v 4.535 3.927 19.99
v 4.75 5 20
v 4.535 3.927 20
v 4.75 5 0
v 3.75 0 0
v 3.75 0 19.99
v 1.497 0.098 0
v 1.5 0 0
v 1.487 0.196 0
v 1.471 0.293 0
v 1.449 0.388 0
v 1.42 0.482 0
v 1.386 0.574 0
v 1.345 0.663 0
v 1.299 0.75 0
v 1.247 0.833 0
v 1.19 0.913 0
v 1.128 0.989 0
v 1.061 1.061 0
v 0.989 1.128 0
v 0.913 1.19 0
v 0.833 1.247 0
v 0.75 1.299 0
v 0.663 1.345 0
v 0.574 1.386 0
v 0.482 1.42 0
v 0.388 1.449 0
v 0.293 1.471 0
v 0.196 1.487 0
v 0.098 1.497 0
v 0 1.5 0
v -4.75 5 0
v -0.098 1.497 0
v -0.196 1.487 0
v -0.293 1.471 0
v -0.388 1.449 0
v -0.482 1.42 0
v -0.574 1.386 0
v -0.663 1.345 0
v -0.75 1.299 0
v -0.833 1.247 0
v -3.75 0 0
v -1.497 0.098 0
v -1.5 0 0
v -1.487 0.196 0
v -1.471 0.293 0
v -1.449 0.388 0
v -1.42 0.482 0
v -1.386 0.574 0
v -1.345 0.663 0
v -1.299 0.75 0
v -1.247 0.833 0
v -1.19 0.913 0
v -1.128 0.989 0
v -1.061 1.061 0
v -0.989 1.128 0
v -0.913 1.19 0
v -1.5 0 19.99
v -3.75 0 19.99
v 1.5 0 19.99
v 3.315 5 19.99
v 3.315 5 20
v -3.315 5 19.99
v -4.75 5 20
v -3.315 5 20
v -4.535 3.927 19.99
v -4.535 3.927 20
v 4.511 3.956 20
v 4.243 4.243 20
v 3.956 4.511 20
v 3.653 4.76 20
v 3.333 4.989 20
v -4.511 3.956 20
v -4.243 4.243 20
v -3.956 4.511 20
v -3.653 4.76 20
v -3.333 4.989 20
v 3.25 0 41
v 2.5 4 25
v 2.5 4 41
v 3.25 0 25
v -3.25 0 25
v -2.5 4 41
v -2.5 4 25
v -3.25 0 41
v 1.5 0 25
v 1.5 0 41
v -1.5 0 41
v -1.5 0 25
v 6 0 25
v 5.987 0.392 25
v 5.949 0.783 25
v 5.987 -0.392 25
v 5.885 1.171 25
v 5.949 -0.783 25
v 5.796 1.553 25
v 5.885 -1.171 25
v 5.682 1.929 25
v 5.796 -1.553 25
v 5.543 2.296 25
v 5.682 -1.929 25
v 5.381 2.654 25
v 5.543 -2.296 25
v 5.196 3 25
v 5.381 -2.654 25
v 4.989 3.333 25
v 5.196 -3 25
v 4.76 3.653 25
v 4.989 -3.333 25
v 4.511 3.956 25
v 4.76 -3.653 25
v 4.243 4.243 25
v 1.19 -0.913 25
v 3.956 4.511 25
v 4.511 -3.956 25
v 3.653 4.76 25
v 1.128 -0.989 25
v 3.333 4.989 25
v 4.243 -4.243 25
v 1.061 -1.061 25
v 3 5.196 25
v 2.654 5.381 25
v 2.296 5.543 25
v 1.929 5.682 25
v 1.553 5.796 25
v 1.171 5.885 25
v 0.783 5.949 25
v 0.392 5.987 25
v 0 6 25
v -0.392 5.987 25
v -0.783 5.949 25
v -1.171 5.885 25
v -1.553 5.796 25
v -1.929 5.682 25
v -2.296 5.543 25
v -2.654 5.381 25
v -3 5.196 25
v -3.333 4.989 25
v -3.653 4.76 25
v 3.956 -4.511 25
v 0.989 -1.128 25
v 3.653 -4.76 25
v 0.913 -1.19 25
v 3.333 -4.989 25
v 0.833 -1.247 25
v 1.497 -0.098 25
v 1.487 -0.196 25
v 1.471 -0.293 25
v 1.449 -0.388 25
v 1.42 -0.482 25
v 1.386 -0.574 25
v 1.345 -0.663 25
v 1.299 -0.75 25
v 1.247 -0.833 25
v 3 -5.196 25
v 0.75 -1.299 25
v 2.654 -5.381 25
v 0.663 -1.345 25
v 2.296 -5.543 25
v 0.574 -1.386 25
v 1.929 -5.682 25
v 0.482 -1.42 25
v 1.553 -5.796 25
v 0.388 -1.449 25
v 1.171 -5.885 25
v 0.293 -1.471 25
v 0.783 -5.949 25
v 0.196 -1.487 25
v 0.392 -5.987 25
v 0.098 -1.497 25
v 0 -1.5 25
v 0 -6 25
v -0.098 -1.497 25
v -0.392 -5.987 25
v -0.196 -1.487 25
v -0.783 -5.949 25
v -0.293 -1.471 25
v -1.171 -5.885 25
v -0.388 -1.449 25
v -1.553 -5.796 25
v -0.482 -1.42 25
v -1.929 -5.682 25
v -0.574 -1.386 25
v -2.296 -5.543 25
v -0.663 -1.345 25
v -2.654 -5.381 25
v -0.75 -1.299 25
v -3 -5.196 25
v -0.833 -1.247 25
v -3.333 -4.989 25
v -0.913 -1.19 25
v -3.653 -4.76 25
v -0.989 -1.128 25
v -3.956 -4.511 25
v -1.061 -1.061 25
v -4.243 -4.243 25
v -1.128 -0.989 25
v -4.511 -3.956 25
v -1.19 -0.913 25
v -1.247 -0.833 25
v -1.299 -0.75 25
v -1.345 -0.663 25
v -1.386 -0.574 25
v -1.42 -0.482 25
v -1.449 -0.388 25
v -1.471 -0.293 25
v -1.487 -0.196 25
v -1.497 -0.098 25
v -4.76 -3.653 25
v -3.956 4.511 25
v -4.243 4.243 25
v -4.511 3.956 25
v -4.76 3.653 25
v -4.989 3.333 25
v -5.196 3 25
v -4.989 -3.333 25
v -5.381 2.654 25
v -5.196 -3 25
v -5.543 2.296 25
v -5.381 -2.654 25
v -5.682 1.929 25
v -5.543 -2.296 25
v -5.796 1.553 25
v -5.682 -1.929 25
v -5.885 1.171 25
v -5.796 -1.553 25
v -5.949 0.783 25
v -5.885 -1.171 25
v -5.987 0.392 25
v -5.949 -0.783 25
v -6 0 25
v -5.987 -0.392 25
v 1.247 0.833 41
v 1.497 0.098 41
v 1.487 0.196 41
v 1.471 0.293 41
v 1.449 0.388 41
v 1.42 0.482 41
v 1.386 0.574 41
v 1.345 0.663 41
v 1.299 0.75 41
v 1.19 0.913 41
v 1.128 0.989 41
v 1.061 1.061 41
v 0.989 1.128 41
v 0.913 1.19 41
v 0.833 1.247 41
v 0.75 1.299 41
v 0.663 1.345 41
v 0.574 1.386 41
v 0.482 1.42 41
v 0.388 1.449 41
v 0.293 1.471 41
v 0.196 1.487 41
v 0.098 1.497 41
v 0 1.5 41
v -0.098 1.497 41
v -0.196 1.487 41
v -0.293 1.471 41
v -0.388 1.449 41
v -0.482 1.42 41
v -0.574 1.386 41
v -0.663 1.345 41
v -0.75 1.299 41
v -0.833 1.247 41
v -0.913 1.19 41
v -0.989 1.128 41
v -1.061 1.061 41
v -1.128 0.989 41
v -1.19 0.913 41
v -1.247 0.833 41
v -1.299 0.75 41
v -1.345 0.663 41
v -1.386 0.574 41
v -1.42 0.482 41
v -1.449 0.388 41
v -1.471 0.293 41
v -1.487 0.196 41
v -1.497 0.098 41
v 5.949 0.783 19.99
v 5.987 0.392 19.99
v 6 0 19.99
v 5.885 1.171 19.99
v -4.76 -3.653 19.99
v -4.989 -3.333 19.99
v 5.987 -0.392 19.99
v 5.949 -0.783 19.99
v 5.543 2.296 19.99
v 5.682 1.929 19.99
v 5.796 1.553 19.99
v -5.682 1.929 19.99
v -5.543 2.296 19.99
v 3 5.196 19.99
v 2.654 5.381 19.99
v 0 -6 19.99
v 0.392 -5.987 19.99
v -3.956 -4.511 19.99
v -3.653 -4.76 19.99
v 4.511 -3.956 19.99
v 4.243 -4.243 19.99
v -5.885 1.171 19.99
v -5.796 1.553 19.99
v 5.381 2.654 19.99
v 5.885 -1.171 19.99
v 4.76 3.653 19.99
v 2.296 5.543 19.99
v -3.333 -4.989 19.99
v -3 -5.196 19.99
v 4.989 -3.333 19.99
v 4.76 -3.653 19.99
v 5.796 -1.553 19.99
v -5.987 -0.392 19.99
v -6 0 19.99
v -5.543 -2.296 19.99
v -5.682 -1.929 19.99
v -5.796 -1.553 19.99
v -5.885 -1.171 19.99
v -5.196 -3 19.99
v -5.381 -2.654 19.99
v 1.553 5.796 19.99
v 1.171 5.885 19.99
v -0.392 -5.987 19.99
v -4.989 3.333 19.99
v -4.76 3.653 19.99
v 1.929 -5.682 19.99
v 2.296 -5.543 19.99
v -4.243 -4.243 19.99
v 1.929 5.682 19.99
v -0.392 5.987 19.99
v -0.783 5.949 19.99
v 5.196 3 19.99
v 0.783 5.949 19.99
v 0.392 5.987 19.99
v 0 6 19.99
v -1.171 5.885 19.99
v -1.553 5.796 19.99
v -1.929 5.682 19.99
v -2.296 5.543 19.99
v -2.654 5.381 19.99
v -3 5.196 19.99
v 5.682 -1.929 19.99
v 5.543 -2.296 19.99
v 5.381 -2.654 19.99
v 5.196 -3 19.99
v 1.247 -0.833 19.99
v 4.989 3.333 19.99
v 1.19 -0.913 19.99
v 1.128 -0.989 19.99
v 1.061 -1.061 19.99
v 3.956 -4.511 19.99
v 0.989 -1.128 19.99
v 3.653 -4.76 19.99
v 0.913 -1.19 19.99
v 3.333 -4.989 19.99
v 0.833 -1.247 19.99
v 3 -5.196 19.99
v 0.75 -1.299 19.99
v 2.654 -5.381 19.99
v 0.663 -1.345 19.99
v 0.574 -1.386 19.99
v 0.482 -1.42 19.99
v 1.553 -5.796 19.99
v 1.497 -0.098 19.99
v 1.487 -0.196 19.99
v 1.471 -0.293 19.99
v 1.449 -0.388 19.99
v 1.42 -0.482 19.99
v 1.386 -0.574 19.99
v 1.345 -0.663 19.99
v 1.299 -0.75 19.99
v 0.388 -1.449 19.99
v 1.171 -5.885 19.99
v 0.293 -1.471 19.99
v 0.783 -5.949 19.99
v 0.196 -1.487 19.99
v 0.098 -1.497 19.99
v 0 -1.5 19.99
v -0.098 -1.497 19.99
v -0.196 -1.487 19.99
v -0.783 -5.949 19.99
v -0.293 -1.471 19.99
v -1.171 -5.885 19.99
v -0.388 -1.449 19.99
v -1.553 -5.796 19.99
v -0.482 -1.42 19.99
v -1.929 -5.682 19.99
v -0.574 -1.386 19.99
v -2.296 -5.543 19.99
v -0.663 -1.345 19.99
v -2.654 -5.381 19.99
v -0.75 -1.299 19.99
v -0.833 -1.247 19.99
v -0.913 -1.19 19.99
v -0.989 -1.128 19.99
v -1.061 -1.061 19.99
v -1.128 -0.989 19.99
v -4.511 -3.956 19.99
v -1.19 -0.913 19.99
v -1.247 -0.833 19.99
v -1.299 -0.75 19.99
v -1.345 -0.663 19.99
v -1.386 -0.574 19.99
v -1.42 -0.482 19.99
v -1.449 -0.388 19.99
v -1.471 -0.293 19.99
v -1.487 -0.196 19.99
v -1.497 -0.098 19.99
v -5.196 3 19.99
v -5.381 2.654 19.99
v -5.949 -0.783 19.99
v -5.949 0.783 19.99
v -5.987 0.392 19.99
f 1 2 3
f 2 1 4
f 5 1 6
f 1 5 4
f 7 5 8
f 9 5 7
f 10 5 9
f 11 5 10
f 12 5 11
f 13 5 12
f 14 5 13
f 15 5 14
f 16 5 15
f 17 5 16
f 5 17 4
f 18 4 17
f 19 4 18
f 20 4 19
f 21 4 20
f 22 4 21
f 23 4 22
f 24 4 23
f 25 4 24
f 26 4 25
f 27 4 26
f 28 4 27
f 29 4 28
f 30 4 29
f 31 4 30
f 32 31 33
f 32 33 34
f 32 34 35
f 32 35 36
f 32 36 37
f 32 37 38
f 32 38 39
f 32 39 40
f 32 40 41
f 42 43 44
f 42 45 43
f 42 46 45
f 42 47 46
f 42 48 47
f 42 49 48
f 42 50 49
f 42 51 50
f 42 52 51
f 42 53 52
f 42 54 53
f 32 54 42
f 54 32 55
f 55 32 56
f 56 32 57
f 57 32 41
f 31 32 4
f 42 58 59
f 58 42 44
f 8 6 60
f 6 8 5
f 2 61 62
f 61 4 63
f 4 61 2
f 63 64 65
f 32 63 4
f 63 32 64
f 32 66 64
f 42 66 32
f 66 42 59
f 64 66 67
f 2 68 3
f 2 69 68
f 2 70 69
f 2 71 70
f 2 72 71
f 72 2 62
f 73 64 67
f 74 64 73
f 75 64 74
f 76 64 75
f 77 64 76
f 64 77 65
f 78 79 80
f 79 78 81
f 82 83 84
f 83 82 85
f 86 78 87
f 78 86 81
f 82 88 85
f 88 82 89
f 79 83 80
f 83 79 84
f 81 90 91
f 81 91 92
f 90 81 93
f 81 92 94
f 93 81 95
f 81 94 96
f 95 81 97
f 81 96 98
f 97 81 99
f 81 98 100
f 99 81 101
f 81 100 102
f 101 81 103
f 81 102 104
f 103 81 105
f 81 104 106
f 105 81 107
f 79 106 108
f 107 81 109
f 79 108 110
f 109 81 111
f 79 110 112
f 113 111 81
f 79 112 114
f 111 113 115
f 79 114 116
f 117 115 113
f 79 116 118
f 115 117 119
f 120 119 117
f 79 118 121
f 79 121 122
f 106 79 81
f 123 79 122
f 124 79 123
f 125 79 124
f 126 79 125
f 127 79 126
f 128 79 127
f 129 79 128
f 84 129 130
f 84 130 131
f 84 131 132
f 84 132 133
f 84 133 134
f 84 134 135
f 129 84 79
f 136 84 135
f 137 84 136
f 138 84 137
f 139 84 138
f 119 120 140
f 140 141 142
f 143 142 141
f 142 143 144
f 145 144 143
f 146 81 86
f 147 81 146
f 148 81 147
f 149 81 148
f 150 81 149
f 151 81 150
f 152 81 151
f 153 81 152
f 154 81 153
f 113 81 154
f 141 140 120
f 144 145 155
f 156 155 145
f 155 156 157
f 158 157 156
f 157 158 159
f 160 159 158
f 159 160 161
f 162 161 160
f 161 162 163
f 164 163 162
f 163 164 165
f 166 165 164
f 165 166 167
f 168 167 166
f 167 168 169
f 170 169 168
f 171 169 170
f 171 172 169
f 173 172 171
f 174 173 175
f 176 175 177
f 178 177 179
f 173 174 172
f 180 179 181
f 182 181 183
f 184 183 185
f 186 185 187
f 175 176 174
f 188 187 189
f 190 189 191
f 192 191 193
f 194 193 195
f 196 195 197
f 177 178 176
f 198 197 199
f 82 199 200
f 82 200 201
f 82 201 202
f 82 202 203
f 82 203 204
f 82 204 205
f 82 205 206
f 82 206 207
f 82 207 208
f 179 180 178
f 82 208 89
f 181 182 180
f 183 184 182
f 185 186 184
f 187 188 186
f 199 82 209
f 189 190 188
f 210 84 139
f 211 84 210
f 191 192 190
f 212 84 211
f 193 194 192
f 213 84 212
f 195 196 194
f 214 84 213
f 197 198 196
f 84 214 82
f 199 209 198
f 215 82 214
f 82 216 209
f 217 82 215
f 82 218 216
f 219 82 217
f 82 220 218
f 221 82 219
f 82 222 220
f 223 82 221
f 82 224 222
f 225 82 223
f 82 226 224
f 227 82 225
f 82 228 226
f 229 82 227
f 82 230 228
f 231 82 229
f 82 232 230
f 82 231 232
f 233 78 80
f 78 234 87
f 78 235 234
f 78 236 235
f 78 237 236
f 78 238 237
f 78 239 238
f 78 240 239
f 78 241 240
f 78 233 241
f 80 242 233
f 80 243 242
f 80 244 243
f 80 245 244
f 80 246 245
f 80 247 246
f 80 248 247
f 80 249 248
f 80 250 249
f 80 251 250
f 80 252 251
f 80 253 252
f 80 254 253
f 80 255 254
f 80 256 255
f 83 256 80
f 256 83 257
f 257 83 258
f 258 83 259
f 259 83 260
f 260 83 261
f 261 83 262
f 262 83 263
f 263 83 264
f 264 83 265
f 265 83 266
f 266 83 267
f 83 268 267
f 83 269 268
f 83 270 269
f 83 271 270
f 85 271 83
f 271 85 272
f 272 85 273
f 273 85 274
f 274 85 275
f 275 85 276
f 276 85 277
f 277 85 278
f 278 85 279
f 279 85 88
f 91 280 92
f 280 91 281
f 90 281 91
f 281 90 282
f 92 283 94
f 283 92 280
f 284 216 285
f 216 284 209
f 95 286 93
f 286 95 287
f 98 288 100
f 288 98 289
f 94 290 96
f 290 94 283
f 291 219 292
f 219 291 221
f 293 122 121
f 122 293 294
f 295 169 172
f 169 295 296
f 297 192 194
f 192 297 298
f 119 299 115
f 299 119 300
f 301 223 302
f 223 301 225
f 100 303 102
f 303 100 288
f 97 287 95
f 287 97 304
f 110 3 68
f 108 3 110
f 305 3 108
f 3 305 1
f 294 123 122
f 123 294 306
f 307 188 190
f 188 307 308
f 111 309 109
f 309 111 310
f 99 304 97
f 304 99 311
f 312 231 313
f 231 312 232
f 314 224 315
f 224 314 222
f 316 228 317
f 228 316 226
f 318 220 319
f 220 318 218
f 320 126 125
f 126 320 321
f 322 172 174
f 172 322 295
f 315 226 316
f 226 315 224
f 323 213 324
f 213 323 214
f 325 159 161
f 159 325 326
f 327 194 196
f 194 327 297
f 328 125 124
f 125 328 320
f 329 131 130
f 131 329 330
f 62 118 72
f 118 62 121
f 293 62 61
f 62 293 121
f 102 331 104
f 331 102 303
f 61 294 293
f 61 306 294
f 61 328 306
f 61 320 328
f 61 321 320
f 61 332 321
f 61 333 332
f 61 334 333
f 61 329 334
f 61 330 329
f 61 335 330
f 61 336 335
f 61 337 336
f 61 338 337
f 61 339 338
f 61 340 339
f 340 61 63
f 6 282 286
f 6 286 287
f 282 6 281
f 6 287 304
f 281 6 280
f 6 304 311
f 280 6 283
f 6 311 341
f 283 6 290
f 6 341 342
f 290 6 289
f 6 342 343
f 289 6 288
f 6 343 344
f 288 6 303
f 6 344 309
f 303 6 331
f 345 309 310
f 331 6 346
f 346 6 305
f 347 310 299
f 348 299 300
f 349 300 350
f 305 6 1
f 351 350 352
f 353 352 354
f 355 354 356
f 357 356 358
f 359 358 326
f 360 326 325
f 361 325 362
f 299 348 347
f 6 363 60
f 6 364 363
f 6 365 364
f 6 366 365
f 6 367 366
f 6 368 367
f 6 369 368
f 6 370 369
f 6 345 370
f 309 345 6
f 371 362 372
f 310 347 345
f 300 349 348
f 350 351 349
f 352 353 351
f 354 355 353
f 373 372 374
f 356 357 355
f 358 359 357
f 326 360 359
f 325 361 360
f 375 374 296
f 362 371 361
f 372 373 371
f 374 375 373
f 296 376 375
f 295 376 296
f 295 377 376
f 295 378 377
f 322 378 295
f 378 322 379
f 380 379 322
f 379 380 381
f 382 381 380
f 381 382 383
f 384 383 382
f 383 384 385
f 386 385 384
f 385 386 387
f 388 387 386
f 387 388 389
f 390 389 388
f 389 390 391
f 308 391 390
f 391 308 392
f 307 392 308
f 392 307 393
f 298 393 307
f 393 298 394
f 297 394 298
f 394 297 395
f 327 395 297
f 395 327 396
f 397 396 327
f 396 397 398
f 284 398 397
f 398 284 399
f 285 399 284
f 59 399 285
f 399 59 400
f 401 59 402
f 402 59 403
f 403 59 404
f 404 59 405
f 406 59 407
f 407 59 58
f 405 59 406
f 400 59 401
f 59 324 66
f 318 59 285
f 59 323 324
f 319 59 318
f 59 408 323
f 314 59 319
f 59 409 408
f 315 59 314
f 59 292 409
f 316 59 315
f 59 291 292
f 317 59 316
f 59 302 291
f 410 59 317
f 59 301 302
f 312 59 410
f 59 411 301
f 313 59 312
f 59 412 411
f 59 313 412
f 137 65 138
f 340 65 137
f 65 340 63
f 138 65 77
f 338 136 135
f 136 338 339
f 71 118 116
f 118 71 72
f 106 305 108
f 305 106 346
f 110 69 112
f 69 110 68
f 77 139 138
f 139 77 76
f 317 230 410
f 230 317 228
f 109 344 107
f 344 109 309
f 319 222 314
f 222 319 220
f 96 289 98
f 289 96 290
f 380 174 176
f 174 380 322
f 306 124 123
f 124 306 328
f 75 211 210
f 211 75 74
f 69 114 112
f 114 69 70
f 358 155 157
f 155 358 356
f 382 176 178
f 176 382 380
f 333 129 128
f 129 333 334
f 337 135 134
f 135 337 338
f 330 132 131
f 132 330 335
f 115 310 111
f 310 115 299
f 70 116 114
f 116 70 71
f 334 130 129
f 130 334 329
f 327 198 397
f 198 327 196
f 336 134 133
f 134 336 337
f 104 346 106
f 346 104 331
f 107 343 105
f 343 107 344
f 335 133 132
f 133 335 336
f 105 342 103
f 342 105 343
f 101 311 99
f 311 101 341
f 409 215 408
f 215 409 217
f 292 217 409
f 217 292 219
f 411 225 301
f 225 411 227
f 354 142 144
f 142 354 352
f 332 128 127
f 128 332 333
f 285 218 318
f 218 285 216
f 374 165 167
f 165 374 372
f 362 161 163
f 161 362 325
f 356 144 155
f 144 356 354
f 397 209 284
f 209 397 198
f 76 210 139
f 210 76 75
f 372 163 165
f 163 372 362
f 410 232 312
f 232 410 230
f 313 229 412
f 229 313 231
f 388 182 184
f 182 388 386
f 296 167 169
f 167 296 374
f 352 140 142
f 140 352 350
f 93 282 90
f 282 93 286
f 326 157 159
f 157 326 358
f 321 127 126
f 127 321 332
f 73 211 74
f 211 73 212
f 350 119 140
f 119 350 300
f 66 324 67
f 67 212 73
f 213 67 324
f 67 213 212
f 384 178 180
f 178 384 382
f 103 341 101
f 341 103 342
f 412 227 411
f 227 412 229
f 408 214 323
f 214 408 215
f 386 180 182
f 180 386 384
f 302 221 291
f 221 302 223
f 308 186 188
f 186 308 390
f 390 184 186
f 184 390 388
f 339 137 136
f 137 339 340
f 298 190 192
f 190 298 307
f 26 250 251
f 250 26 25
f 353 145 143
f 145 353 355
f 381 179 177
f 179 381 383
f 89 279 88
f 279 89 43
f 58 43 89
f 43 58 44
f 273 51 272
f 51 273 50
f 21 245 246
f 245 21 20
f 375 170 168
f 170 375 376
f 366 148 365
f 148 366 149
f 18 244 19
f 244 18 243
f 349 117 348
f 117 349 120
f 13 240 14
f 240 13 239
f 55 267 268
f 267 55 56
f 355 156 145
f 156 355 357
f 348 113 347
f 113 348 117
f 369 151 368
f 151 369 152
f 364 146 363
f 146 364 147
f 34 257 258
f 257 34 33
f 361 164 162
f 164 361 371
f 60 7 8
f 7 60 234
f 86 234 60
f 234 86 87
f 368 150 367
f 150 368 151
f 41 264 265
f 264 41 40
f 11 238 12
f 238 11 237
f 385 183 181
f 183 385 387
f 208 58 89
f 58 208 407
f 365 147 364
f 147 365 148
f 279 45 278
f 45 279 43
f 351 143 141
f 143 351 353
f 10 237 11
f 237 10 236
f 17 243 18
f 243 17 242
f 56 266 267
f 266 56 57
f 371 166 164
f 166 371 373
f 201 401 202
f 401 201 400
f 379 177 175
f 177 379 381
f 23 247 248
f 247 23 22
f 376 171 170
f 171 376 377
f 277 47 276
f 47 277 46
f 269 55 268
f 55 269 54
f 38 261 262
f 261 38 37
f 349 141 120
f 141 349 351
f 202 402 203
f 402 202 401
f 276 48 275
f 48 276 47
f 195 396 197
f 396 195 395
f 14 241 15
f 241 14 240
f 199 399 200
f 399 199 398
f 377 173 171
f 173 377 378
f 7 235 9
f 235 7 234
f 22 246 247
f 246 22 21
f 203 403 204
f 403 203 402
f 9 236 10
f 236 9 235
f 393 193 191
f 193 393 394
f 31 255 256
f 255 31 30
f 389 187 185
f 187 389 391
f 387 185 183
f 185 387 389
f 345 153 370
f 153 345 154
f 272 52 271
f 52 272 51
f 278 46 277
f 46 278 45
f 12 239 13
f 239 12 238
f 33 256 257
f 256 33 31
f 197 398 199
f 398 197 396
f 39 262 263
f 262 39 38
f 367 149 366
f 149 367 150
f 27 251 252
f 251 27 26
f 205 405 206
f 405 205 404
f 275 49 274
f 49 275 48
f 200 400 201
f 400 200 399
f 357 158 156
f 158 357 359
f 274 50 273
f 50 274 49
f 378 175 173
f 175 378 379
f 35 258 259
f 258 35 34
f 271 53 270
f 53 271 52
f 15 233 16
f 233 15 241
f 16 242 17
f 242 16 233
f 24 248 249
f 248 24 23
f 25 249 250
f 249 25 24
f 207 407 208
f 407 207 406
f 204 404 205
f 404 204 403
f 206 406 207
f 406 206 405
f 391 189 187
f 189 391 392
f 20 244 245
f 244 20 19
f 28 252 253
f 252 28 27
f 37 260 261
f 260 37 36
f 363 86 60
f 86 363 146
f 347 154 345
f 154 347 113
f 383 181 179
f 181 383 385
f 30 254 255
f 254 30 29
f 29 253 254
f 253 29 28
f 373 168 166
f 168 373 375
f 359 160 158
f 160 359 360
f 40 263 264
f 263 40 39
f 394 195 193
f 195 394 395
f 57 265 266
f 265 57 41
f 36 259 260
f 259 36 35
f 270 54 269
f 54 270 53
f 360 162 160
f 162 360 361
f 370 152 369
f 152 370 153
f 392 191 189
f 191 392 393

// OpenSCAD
// Straight hose-barb reducer: 8 mm ID tubing end with two stacked barbs,
// a 12 mm collar, and a second end with two stacked barbs for 5 mm ID tubing.
// A 3 mm bore runs straight through the full length.
// Print orientation: standing upright along +Z.

$fn = 96;

// ---- 8 mm tubing end ----
tube_a_id   = 8;    // tubing inner diameter
barb_a_h    = 10;   // barb height
barb_a_d0   = 7.5;  // barb outer diameter at bottom
barb_a_d1   = 9.5;  // barb outer diameter at top
barb_a_n    = 2;    // number of barbs, stacked
tube_a_len  = 20;   // end length (z = 0 to 20)

// ---- Collar ----
collar_d    = 12;   // collar diameter
collar_h    = 5;    // collar height (z = 20 to 25)

// ---- 5 mm tubing end ----
tube_b_id   = 5;    // tubing inner diameter
barb_b_h    = 8;    // barb height
barb_b_d0   = 6.5;  // barb outer diameter at bottom
barb_b_d1   = 5.0;  // barb outer diameter at top
barb_b_n    = 2;    // number of barbs, stacked
tube_b_len  = 16;   // end length (z = 25 to 41)

// ---- Bore ----
bore_d      = 3;    // through-bore diameter

// ---- Modelling helpers ----
overlap     = 0.01; // small overlap so adjacent shapes fuse cleanly
eps         = 0.5;  // cutter overshoot past faces

// Total height of the part
total_h = tube_a_len + collar_h + tube_b_len;

module barbed_end(len, d0, d1, nh) {
    // Each barb is a cone from its bottom diameter up to the top diameter of the end,
    // then a straight step back down to the bottom diameter (sawtooth profile).
    for (i = [0 : nh - 1]) {
        translate([0, 0, i * (len / nh)])
            linear_extrude(height = len / nh)
                polygon([
                    [0, 0],
                    [d0 / 2, 0],
                    [d1 / 2, len / (2 * nh)],
                    [-d1 / 2, len / (2 * nh)],
                    [-d0 / 2, 0]
                ]);
    }
}

difference() {
    union() {
        // First end (z = 0 to 20)
        translate([0, 0, 0])
            barbed_end(tube_a_len, barb_a_d0, barb_a_d1, barb_a_n);

        // Collar (z = 20 to 25)
        translate([0, 0, tube_a_len - overlap])
            cylinder(d = collar_d, h = collar_h + overlap);

        // Second end (z = 25 to 41)
        translate([0, 0, tube_a_len + collar_h])
            barbed_end(tube_b_len, barb_b_d0, barb_b_d1, barb_b_n);
    }

    // Through bore
    translate([0, 0, -eps])
        cylinder(d = bore_d, h = total_h + 2 * eps);
}
